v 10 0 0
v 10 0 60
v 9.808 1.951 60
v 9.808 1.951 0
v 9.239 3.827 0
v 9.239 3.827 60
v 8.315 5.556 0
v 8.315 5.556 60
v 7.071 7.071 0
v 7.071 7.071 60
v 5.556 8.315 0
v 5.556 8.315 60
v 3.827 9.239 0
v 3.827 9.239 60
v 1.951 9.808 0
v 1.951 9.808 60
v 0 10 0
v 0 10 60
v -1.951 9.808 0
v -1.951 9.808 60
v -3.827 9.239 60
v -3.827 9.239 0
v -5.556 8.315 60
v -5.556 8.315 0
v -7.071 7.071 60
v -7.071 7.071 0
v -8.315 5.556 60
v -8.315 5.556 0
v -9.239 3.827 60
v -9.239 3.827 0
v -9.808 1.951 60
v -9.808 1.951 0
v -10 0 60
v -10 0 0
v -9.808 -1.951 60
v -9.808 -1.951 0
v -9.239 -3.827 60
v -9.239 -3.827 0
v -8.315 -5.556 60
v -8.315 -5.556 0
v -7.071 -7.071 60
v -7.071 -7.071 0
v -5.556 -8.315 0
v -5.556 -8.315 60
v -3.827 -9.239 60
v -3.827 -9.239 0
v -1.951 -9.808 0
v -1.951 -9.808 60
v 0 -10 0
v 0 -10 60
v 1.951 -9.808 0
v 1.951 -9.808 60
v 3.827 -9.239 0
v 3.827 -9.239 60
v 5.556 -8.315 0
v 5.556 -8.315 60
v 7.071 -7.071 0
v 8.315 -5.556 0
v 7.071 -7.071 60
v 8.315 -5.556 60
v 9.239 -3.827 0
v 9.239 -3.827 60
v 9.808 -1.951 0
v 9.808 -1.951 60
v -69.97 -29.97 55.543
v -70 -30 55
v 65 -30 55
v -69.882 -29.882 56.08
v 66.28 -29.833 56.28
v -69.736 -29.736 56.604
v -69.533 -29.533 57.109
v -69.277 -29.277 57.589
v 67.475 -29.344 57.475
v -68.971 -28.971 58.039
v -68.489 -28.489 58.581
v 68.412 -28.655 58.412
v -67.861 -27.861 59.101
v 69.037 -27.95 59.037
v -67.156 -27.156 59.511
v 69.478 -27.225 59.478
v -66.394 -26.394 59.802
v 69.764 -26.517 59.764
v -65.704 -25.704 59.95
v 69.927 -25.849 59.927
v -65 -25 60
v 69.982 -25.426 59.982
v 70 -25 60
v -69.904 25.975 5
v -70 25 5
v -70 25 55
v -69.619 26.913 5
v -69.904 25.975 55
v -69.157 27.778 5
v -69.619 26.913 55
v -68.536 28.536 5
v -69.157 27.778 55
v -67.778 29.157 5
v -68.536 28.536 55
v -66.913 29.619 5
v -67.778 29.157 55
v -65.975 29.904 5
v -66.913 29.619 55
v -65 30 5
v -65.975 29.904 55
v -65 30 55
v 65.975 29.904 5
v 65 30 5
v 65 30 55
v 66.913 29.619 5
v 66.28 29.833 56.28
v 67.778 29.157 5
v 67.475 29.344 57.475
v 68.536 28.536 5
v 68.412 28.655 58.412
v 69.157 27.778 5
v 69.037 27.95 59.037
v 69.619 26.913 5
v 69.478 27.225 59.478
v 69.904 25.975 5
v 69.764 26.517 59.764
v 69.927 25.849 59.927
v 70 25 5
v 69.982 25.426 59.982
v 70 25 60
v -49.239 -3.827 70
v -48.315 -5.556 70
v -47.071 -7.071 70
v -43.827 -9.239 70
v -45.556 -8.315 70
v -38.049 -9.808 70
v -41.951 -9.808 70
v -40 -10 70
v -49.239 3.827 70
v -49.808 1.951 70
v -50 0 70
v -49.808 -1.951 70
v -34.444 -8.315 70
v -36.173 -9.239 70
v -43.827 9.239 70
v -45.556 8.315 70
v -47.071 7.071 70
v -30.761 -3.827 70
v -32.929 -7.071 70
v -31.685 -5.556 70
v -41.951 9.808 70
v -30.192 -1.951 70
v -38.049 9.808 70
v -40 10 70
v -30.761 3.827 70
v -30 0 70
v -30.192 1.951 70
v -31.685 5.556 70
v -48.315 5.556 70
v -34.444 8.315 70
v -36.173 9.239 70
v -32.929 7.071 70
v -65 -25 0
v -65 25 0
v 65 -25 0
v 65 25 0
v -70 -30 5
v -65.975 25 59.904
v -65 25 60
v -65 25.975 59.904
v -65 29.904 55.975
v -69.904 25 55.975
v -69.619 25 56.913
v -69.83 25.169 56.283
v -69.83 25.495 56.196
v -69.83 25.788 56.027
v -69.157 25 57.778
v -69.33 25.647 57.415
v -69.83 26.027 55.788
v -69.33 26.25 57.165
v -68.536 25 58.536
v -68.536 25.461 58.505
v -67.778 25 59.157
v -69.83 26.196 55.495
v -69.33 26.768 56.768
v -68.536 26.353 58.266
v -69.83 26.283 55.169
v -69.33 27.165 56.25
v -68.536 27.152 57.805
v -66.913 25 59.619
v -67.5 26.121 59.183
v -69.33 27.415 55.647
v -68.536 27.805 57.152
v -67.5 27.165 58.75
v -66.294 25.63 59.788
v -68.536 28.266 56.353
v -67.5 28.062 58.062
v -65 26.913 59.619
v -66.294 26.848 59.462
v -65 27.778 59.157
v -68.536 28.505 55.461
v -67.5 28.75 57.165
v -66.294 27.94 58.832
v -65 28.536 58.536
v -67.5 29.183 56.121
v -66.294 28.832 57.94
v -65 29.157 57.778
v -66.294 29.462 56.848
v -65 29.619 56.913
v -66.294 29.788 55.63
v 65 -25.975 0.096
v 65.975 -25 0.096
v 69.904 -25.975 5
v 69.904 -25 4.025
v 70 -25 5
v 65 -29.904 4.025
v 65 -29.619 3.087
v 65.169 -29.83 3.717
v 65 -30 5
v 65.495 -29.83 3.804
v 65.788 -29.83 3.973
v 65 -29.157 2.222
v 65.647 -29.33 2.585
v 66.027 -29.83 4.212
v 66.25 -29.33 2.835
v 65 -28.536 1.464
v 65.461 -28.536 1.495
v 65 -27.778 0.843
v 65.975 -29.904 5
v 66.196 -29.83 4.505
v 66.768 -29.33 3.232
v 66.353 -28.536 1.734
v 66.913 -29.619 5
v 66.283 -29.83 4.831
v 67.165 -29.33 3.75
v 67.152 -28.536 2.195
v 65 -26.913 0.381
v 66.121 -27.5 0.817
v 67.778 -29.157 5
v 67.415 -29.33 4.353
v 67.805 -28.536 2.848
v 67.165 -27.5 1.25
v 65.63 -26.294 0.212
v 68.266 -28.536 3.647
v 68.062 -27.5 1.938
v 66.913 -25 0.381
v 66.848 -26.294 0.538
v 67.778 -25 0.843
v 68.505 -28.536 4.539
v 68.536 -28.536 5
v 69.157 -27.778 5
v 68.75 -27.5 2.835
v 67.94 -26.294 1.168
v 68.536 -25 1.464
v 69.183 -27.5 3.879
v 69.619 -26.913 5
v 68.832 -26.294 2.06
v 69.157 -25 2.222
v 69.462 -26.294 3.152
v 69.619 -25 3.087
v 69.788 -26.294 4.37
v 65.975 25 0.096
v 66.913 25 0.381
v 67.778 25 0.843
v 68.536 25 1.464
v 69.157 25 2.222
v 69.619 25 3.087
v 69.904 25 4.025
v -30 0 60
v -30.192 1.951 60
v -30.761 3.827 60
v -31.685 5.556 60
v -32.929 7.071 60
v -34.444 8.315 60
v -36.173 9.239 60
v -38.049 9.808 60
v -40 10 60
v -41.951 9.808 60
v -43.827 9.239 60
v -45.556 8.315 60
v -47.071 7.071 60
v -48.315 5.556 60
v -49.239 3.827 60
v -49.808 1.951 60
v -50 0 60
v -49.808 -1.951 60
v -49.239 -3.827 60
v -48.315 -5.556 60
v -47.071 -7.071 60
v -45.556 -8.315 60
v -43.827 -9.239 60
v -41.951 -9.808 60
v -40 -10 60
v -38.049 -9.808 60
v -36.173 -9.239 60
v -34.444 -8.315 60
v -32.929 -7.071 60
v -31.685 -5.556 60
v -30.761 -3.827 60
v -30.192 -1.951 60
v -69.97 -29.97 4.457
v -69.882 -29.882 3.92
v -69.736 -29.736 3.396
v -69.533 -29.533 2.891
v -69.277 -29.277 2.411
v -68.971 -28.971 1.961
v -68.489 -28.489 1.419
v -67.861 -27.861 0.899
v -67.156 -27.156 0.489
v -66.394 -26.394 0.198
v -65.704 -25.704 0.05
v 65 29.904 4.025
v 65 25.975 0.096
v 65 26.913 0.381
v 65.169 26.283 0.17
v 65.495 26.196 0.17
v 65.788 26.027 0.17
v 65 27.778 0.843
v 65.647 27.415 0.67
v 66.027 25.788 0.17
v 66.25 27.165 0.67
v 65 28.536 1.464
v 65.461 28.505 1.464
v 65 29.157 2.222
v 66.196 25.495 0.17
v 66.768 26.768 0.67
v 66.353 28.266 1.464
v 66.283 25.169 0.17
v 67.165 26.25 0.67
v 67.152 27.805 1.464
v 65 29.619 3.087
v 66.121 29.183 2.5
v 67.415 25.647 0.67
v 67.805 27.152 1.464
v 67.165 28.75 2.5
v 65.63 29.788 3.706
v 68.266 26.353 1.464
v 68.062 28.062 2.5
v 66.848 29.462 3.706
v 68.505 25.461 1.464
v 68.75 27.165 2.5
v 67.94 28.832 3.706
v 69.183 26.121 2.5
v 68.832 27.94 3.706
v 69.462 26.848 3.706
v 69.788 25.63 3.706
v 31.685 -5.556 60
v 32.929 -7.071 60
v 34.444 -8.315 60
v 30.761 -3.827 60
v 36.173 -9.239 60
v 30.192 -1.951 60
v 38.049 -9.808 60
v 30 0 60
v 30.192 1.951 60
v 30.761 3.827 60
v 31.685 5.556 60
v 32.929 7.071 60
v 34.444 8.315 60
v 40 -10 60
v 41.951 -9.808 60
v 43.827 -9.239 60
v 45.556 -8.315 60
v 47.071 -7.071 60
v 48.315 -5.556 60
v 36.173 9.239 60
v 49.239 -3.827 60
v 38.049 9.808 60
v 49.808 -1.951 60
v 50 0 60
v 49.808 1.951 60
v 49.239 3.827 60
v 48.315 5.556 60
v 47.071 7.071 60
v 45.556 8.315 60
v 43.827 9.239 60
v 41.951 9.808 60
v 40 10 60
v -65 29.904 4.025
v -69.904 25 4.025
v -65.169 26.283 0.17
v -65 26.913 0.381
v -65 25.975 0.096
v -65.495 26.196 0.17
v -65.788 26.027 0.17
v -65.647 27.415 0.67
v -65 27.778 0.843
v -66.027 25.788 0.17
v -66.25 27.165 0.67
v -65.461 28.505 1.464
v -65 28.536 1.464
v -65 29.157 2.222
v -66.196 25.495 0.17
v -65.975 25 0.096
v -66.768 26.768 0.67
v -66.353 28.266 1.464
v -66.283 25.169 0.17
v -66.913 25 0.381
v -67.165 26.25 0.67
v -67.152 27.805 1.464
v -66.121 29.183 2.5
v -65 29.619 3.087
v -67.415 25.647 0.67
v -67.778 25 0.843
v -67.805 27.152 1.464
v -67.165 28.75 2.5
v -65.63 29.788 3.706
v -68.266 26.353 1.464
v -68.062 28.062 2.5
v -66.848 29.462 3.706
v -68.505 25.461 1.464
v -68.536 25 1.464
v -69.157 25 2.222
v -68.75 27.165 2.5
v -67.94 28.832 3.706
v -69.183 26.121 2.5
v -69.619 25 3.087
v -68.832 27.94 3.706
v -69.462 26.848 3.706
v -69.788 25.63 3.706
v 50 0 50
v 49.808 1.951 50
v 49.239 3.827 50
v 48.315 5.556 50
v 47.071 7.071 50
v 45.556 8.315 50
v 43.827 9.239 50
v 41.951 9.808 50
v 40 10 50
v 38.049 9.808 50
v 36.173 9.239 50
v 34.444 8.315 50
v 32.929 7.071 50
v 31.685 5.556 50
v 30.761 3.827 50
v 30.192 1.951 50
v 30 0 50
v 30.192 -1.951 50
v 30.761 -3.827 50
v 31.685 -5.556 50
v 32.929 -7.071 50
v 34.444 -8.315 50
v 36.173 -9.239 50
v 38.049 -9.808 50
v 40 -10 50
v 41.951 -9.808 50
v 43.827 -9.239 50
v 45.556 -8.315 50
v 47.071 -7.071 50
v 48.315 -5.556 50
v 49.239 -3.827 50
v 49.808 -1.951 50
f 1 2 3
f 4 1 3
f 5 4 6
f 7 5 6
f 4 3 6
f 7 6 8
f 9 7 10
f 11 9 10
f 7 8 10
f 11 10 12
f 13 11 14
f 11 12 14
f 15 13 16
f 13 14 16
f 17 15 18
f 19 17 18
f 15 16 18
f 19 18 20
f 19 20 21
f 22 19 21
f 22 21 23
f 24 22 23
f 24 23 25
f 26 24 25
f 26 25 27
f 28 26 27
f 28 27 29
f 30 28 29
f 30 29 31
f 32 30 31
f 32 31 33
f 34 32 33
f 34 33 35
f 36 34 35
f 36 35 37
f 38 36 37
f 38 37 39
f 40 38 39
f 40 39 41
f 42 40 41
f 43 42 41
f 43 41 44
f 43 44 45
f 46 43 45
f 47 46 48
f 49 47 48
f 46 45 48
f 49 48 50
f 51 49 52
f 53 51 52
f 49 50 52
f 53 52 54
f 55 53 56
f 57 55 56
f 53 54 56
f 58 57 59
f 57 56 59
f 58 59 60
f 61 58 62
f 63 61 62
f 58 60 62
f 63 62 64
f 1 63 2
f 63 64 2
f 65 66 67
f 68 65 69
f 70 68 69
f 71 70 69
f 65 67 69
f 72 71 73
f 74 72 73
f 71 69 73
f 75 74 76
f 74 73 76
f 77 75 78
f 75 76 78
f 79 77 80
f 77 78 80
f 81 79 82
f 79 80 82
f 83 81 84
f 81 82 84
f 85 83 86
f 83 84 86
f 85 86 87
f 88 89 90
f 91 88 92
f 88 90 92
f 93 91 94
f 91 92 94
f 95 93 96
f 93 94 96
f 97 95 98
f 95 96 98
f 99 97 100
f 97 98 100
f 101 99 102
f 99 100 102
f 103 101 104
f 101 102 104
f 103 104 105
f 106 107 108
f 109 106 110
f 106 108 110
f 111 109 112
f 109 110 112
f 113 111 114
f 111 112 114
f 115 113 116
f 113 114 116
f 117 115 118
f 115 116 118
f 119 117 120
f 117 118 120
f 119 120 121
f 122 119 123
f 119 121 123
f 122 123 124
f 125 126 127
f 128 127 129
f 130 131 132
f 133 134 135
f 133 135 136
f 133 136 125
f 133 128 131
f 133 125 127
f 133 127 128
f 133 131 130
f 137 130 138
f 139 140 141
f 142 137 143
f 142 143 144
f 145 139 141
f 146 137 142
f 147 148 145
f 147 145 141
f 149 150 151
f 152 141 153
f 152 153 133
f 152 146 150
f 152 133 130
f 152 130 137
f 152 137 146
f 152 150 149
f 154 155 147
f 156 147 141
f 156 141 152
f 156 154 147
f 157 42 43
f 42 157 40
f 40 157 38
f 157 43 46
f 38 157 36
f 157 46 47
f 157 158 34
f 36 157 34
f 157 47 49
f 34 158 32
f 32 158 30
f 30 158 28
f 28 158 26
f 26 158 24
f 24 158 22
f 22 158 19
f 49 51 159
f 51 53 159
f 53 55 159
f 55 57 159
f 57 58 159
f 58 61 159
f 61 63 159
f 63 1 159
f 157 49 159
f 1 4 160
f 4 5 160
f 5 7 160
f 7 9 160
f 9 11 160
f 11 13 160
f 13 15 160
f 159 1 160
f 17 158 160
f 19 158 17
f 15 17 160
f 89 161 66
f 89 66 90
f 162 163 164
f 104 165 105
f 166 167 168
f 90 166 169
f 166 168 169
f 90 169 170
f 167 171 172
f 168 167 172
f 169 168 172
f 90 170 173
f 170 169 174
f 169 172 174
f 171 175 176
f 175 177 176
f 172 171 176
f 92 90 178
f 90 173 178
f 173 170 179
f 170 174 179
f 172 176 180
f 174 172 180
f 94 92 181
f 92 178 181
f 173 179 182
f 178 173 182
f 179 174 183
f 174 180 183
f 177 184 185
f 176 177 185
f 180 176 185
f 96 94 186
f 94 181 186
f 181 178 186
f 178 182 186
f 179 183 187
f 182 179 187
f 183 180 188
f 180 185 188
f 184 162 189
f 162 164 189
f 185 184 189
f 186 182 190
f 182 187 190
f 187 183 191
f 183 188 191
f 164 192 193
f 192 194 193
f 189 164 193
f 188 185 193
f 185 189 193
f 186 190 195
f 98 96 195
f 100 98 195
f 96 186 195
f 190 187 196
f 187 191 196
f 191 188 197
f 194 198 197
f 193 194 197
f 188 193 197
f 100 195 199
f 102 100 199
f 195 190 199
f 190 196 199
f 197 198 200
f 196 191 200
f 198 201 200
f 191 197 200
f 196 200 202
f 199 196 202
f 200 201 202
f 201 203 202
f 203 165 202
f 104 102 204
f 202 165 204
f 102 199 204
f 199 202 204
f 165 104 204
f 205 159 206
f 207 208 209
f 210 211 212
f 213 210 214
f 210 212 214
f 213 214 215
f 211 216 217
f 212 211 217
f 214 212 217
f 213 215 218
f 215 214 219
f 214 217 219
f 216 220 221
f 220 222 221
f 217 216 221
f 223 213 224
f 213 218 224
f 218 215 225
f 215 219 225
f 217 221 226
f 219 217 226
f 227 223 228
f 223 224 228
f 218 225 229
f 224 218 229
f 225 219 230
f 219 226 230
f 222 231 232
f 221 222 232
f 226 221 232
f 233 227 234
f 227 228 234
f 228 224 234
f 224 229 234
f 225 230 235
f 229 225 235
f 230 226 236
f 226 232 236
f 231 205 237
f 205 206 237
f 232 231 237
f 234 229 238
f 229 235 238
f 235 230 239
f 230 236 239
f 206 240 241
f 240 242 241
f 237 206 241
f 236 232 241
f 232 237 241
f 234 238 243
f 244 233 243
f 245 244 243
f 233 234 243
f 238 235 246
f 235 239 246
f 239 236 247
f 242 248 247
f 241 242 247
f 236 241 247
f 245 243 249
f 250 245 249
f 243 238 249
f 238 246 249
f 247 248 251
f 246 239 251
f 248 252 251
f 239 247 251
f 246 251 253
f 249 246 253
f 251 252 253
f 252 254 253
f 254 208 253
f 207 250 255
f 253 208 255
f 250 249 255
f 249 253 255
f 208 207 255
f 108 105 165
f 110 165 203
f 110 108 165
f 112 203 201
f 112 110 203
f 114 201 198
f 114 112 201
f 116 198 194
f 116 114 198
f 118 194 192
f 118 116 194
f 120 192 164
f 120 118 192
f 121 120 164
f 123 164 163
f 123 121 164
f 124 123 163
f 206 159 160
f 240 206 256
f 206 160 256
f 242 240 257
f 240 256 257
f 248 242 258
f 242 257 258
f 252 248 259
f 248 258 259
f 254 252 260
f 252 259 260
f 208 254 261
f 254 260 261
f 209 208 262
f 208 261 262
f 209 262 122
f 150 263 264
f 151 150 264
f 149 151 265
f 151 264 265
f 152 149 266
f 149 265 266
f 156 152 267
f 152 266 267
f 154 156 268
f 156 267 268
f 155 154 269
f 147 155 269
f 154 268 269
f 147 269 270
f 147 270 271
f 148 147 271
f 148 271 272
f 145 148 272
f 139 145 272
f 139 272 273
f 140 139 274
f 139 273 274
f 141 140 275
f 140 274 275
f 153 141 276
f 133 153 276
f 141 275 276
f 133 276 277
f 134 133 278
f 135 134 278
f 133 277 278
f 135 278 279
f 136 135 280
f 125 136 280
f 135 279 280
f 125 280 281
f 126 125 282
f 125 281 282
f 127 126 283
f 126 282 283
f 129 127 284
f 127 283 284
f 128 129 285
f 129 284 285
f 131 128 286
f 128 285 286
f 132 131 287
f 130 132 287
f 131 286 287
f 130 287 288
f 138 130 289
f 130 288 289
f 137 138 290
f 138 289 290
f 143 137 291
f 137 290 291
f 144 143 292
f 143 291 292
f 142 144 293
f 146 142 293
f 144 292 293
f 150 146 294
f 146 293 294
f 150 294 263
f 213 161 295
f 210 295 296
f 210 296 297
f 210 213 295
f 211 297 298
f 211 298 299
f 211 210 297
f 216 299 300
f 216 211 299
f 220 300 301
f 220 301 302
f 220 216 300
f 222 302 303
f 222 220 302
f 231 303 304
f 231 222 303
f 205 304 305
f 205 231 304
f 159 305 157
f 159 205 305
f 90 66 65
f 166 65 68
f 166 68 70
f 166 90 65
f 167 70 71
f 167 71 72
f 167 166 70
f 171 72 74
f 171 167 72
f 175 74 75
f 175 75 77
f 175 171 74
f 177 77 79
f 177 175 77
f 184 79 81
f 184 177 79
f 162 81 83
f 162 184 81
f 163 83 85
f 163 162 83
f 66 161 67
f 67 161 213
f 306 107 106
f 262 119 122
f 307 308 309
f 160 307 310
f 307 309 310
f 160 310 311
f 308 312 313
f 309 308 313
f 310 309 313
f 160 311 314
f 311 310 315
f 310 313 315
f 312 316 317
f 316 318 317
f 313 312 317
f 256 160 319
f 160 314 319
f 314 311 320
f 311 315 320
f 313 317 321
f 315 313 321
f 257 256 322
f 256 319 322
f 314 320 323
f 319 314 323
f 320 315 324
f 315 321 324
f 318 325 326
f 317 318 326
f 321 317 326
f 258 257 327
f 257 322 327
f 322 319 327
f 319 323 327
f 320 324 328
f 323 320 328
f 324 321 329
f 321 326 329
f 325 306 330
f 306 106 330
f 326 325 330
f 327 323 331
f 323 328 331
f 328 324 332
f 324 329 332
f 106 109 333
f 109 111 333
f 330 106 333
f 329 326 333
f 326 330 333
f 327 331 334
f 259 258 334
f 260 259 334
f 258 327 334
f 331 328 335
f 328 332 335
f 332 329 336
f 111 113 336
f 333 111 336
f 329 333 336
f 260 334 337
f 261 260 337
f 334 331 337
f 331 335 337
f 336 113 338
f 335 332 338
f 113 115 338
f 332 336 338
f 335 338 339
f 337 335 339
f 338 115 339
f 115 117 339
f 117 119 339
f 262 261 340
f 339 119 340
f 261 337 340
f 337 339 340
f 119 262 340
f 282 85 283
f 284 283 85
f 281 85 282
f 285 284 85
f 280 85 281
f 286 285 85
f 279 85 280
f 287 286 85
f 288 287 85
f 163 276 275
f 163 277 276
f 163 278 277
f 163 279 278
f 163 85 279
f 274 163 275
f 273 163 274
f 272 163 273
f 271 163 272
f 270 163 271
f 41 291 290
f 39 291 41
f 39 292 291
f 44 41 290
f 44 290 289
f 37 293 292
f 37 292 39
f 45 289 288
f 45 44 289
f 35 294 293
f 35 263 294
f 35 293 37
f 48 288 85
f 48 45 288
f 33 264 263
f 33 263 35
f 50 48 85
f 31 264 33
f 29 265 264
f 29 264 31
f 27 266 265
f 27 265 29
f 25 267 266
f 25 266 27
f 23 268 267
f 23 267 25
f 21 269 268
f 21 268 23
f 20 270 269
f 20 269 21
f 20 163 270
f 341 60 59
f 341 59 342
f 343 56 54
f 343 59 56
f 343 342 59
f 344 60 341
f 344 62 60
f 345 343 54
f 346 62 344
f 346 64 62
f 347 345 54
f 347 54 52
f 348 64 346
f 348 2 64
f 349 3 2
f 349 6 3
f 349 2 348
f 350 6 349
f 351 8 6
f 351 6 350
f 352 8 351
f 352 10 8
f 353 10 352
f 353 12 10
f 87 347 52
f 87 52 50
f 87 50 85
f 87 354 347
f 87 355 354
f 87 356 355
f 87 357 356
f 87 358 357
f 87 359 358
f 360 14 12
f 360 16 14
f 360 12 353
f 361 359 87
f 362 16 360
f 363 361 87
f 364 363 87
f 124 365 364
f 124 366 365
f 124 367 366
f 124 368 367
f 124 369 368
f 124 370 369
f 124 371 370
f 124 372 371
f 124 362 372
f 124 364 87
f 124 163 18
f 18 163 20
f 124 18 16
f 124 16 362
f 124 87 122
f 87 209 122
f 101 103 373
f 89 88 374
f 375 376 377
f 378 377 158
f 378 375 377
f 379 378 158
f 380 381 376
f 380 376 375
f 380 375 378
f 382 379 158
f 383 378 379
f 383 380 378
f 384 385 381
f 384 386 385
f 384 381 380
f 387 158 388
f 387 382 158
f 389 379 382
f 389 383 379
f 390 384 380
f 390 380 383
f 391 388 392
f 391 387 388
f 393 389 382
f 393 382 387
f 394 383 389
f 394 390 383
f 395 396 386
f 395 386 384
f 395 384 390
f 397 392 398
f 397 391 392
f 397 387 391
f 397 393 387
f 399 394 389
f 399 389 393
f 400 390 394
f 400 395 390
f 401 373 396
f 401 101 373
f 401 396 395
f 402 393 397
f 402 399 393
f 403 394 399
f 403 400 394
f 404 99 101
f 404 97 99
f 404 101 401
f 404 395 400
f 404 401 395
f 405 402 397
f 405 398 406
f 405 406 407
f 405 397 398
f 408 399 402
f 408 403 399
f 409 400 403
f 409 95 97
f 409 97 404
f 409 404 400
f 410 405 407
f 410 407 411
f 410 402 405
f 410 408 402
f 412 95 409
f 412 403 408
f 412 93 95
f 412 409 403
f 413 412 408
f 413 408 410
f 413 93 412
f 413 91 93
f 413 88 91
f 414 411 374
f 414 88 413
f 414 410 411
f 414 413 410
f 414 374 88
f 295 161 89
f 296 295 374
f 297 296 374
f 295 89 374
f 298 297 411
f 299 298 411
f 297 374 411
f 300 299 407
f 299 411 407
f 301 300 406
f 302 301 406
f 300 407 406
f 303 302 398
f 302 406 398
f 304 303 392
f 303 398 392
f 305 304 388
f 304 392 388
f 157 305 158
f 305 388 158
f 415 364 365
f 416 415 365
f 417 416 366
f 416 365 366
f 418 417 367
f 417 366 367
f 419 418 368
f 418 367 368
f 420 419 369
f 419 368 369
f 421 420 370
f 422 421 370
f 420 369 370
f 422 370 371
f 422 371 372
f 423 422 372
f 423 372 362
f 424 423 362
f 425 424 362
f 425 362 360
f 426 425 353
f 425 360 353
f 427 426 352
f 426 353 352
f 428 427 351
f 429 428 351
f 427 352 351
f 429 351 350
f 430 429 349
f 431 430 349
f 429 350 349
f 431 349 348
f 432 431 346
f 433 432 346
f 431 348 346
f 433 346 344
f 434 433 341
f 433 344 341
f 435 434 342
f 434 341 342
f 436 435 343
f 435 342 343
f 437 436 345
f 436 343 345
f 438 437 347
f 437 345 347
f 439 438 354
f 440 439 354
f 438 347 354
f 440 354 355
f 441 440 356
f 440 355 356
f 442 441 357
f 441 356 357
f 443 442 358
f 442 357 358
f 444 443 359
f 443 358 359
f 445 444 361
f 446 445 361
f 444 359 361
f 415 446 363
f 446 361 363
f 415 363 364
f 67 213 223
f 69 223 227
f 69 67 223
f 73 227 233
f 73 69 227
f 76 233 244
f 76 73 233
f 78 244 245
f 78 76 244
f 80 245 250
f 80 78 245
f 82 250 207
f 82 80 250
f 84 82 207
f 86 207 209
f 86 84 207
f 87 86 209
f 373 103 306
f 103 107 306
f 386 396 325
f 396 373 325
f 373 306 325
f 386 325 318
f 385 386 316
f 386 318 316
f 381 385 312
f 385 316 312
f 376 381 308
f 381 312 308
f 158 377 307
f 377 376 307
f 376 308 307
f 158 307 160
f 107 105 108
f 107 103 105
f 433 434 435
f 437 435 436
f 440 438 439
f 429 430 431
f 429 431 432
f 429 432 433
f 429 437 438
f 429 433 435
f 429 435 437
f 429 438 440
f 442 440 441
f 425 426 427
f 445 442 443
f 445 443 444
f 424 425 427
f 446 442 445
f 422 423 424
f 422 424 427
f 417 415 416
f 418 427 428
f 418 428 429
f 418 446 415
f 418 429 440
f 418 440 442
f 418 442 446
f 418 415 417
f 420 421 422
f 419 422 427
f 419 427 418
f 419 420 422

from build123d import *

# Parameters (mm, degrees)
F0_W     = 140
F0_H     = 60
F1_DEPTH = 60
F2_R     = 10
F5_DEPTH = 10
F4_R     = 10
F6_DEPTH = 103.2
F3_R     = 10
F7_DEPTH = 10
F8_R     = 5


with BuildPart() as f1:
    # F0 (on Top) → F1 (new body)
    with BuildSketch(Plane.XY):
        Rectangle(F0_W, F0_H)
    extrude(amount=F1_DEPTH)

    # F2 (on face) → F5 (join)
    with BuildSketch(Plane.XY.offset(60)):
        with Locations((-40, 0)):
            Circle(F2_R)
    extrude(amount=F5_DEPTH)

    # F4 (on face) → F6 (cut)
    with BuildSketch(Plane.XY.offset(60)):
        Circle(F4_R)
    extrude(amount=-F6_DEPTH, mode=Mode.SUBTRACT)

    # F3 (on face) → F7 (cut)
    with BuildSketch(Plane.XY.offset(60)):
        with Locations((40, 0)):
            Circle(F3_R)
    extrude(amount=-F7_DEPTH, mode=Mode.SUBTRACT)

    # F8
    f8_edges = [f1.edges().sort_by_distance(p)[0] for p in [
        (0, 30, 60),
        (-70, 0, 60),
        (0, -30, 60),
        (70, 30, 30),
        (-70, 30, 30),
        (0, 30, 0),
        (70, 0, 0),
        (0, -30, 0),
        (-70, 0, 0),
        (70, -30, 30),
    ]]
    fillet(f8_edges, radius=F8_R)


solid = f1.part
